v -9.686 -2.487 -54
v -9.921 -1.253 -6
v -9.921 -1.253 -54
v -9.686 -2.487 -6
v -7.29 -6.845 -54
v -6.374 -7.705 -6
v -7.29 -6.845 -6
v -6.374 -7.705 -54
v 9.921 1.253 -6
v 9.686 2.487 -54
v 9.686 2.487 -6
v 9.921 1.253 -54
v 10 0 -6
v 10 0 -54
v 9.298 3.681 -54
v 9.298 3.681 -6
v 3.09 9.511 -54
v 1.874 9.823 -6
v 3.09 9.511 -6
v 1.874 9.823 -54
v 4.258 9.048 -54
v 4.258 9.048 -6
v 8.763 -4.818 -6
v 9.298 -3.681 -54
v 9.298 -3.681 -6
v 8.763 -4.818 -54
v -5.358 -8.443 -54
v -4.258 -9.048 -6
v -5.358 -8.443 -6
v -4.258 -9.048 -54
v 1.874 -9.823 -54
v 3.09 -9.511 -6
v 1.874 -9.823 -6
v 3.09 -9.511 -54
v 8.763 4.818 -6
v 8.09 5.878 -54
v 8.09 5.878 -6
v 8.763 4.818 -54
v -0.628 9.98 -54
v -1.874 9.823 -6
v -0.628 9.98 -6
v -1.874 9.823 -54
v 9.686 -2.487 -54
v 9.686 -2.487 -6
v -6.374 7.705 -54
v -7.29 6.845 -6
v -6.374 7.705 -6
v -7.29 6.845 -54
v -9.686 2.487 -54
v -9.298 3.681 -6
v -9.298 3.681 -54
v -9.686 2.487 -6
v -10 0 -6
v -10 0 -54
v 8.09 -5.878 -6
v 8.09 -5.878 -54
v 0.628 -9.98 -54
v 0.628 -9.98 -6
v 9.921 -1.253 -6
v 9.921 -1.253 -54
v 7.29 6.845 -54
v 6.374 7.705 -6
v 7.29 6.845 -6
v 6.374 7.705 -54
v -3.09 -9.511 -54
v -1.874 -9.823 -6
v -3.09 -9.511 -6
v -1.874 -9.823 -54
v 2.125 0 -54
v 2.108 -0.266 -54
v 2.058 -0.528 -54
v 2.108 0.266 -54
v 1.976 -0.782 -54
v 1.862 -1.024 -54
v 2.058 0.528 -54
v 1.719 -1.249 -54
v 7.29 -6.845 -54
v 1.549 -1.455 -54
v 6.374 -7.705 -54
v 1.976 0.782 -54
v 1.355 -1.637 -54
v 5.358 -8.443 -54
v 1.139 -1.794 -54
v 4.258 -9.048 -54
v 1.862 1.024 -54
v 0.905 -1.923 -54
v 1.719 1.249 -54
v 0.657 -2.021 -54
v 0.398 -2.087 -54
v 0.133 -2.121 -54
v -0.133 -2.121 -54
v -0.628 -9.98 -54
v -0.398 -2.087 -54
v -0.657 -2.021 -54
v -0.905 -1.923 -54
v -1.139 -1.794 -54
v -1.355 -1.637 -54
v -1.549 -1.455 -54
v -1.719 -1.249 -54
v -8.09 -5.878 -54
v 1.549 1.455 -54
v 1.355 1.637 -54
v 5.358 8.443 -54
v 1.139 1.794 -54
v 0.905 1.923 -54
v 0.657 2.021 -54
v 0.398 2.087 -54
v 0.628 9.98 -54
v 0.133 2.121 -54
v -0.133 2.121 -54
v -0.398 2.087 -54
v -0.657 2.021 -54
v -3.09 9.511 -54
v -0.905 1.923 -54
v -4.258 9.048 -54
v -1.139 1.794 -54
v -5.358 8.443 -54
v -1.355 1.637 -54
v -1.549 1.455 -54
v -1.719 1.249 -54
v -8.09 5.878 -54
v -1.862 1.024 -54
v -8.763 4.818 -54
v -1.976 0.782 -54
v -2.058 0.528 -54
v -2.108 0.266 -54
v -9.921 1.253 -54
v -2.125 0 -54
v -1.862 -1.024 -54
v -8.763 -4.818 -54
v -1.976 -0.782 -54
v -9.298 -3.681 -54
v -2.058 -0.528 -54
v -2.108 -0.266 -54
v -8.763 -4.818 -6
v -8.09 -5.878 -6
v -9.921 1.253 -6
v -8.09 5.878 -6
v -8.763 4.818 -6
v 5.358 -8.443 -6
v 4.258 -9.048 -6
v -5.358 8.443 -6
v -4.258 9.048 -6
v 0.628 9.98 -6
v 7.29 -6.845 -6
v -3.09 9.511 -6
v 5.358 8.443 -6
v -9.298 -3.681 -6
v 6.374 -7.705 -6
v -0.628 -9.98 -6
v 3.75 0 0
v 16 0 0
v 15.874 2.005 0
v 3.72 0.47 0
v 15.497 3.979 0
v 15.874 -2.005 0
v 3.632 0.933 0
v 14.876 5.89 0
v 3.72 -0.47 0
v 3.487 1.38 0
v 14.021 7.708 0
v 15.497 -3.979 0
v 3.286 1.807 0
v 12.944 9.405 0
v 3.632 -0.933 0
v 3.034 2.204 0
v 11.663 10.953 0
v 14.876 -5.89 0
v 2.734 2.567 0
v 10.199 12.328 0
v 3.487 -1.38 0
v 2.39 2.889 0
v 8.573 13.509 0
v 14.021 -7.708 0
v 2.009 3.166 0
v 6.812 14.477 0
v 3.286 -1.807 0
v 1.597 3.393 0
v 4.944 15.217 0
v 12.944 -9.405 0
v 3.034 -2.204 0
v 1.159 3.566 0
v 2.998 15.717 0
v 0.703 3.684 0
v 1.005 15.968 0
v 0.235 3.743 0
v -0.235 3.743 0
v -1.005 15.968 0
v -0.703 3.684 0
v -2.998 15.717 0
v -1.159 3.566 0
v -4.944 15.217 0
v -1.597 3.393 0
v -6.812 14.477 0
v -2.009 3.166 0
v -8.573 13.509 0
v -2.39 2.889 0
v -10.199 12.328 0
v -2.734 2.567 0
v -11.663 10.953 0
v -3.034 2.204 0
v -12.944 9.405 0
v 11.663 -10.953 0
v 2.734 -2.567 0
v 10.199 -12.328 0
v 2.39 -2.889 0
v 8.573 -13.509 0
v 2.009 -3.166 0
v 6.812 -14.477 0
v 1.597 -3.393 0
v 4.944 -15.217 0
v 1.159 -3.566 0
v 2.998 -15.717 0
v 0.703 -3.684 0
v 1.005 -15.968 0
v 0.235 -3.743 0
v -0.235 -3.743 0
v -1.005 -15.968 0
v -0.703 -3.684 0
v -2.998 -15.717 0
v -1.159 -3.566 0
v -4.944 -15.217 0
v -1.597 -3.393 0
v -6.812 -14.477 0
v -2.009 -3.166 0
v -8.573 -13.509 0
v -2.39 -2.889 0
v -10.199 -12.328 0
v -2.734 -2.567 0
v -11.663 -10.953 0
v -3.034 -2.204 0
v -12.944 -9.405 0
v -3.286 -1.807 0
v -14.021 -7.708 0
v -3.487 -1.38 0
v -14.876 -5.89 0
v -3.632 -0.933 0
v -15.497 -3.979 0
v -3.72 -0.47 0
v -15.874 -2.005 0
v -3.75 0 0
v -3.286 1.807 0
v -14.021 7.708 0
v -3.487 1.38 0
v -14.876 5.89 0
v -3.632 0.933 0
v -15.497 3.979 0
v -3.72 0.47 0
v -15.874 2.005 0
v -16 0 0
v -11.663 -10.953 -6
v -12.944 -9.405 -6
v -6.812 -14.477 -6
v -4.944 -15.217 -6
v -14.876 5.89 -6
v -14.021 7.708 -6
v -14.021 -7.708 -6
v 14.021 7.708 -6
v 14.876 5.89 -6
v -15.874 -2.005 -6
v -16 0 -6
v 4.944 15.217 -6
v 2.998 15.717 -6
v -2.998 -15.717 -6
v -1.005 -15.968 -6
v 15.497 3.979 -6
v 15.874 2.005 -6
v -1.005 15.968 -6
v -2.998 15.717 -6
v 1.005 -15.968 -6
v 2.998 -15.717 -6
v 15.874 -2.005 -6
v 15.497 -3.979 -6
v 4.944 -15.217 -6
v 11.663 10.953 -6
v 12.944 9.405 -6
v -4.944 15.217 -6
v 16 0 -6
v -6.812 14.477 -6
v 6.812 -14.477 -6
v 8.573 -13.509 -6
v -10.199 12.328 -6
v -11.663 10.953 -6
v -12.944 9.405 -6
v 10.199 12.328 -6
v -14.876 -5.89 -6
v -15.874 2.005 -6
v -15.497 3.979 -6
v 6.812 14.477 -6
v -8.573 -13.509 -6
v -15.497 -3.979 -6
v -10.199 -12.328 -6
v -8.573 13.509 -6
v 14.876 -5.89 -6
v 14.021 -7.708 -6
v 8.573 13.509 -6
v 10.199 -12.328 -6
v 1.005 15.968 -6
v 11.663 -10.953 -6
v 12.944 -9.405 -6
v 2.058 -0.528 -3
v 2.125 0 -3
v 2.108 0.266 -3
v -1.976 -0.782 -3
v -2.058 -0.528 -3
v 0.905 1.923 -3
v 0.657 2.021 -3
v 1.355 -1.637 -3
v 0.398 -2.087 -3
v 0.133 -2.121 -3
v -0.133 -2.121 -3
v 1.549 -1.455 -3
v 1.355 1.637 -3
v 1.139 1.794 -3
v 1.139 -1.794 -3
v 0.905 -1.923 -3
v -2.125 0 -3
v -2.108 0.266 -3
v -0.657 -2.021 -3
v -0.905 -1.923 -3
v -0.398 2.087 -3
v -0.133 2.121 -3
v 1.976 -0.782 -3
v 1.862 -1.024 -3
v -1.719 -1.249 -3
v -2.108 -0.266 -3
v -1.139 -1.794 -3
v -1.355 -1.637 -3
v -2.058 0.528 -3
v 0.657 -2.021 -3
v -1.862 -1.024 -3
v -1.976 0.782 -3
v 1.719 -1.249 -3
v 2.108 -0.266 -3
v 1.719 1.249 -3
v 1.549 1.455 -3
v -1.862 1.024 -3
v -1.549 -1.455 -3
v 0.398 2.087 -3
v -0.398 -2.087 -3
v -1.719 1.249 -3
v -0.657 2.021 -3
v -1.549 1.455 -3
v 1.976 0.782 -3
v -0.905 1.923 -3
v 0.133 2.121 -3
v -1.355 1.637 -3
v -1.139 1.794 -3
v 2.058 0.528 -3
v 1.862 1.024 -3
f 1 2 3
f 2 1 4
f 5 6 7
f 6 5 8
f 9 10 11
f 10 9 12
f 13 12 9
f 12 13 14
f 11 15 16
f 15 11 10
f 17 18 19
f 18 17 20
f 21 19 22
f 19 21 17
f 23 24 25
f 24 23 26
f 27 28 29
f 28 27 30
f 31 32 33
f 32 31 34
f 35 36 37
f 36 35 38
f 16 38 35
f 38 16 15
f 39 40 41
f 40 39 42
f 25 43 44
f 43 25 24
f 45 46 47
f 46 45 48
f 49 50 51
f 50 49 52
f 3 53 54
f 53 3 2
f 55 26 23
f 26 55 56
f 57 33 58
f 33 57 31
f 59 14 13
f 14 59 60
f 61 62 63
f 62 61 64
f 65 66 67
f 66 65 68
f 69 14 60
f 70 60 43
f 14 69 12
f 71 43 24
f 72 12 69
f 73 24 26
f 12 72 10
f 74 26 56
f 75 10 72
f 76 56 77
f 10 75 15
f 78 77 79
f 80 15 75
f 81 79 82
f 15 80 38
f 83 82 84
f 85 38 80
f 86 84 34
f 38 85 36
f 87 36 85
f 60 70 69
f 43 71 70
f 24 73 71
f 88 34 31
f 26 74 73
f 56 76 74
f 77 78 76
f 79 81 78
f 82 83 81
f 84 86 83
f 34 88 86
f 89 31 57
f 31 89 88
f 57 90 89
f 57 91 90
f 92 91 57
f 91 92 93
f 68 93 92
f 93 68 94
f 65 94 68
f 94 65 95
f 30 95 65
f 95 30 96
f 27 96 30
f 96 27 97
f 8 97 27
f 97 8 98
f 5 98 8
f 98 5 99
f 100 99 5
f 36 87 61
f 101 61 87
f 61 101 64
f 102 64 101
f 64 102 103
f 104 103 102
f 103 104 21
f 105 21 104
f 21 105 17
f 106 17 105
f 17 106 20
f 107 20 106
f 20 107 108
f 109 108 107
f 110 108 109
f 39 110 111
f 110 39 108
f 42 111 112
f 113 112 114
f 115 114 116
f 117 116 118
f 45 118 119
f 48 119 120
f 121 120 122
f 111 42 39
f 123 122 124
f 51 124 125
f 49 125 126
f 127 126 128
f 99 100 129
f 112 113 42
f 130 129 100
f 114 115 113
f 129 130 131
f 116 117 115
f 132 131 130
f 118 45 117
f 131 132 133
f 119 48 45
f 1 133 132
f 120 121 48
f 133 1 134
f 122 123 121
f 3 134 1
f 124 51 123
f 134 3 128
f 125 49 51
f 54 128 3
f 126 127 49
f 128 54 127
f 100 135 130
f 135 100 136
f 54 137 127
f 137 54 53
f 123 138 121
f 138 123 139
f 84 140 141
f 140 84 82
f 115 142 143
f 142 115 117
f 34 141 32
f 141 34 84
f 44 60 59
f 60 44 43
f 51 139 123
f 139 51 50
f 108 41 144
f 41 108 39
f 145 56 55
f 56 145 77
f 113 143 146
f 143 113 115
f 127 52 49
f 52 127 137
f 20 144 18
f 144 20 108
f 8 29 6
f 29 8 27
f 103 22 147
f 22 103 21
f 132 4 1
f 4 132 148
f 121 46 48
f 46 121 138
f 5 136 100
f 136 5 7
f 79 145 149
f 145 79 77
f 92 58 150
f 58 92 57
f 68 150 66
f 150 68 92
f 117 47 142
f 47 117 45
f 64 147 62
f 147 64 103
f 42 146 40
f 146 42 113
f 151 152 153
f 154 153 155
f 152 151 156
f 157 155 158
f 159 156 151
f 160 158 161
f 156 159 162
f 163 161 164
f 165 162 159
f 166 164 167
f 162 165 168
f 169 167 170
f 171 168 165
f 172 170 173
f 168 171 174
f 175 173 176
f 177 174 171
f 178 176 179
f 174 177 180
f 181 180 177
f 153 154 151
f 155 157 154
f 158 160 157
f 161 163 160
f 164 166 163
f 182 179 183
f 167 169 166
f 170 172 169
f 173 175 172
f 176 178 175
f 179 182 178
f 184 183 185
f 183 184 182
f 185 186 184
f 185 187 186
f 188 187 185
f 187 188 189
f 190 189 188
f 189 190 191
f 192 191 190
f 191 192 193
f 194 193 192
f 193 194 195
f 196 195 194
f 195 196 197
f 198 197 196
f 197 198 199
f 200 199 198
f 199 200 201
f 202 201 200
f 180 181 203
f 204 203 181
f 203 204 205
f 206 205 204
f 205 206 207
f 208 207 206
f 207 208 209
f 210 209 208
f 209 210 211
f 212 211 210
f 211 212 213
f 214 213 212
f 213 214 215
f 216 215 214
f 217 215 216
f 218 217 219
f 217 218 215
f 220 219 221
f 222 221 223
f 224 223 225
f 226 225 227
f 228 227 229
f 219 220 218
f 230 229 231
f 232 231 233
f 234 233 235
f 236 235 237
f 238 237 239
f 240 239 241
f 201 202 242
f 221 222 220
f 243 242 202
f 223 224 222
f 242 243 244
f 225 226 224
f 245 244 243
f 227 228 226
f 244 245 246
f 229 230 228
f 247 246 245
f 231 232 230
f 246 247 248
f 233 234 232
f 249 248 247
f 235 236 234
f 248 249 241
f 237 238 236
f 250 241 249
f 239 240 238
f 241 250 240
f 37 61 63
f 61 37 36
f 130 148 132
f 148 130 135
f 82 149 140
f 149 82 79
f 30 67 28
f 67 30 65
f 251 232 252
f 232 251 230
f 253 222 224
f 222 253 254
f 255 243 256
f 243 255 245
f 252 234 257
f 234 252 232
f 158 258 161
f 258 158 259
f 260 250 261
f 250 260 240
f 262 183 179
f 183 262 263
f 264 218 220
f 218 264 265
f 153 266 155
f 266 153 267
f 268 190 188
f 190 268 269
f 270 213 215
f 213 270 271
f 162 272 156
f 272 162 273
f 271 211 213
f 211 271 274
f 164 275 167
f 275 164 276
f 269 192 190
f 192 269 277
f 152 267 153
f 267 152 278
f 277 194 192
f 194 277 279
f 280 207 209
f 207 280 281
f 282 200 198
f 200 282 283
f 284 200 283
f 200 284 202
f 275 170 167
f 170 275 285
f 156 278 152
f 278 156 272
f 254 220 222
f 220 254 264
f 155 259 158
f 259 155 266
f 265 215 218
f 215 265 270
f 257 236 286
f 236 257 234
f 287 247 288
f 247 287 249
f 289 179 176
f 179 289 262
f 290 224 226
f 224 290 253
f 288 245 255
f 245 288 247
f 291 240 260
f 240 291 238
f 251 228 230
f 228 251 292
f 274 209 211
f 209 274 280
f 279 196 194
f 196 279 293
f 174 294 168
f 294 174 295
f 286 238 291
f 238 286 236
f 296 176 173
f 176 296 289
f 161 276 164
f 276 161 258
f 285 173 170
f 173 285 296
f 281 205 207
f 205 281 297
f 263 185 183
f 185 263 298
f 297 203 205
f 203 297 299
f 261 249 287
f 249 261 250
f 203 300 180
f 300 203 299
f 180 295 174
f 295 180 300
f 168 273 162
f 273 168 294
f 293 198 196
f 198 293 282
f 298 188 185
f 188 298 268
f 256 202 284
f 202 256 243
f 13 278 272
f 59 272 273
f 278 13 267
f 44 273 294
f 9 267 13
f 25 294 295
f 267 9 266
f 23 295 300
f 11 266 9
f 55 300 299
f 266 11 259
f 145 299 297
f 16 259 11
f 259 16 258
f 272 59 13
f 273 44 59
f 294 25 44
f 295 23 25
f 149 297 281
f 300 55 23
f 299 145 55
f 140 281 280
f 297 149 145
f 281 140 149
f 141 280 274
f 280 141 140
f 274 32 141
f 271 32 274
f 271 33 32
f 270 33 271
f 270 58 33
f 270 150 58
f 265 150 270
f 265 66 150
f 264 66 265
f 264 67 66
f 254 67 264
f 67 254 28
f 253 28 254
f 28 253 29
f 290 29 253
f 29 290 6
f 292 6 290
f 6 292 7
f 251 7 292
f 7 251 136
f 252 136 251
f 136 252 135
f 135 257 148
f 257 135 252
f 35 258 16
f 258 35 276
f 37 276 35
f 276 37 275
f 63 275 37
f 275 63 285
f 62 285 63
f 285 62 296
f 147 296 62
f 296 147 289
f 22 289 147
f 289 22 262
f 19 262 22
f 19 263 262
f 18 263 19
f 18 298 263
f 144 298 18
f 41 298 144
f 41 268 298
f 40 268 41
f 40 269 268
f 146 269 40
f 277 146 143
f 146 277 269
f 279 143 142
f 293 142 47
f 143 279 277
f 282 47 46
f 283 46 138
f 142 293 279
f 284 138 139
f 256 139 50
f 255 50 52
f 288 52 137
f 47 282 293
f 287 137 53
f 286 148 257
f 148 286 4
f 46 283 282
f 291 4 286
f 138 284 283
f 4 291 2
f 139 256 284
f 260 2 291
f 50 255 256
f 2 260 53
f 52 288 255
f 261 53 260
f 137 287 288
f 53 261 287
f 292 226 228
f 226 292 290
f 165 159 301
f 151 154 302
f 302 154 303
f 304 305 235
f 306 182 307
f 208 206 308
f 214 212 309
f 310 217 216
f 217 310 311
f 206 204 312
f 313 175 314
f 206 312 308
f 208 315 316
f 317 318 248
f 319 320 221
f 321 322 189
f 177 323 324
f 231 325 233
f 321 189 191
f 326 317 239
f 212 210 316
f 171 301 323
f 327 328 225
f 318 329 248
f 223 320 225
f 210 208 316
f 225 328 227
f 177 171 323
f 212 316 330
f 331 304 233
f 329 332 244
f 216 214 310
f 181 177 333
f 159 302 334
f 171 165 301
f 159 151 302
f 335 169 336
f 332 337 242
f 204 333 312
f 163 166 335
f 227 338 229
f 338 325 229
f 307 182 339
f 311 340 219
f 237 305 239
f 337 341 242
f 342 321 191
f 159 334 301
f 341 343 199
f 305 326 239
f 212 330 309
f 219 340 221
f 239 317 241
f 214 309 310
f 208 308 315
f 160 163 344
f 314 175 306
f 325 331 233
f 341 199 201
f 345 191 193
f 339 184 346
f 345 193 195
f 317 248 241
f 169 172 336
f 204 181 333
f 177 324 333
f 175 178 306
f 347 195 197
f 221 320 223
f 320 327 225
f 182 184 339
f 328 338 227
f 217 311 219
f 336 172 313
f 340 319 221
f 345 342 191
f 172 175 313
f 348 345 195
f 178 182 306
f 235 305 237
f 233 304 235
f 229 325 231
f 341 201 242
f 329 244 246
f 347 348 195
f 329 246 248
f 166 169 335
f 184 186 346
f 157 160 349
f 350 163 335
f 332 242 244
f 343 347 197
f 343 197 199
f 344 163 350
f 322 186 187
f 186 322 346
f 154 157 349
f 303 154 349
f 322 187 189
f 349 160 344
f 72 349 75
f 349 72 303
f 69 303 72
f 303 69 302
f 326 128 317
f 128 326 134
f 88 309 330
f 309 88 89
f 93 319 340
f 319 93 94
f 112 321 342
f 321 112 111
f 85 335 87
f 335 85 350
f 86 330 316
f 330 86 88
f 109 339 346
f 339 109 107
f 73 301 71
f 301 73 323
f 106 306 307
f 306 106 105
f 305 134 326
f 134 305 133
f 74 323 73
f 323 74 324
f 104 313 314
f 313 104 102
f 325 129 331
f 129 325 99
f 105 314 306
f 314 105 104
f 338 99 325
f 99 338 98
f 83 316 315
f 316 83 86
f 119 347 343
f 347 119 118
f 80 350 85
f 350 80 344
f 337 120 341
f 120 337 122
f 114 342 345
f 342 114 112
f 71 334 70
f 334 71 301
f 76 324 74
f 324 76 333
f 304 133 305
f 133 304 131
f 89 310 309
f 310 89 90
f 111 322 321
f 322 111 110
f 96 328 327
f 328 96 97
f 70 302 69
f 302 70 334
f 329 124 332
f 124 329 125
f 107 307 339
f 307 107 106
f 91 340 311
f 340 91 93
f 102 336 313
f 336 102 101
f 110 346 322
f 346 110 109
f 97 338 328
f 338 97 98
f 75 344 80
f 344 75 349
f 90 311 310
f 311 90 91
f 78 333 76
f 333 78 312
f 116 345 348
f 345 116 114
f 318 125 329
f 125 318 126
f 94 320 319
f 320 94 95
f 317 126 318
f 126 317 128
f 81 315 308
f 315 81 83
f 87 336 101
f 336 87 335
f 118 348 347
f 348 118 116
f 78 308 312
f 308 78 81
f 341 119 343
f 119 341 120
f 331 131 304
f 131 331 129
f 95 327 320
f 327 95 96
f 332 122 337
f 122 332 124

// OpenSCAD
$fn = 50;


difference() {
	union() {
		translate(v = [0, 0, -54.0000000000]) {
			cylinder(h = 54, r = 10.0000000000);
		}
		translate(v = [0, 0, -6.0000000000]) {
			cylinder(h = 6, r = 16.0000000000);
		}
	}
	union() {
		translate(v = [0, 0, 0]) {
			rotate(a = [0, 0, 0]) {
				difference() {
					union() {
						#translate(v = [0, 0, -54.0000000000]) {
							cylinder(h = 54, r = 2.0000000000);
						}
						#translate(v = [0, 0, -3]) {
							cylinder(h = 3, r1 = 2.1250000000, r2 = 3.7500000000);
						}
						#translate(v = [0, 0, -54.0000000000]) {
							cylinder(h = 54, r = 2.1250000000);
						}
						#translate(v = [0, 0, -54.0000000000]) {
							cylinder(h = 54, r = 2.0000000000);
						}
					}
					union();
				}
			}
		}
	}
}
